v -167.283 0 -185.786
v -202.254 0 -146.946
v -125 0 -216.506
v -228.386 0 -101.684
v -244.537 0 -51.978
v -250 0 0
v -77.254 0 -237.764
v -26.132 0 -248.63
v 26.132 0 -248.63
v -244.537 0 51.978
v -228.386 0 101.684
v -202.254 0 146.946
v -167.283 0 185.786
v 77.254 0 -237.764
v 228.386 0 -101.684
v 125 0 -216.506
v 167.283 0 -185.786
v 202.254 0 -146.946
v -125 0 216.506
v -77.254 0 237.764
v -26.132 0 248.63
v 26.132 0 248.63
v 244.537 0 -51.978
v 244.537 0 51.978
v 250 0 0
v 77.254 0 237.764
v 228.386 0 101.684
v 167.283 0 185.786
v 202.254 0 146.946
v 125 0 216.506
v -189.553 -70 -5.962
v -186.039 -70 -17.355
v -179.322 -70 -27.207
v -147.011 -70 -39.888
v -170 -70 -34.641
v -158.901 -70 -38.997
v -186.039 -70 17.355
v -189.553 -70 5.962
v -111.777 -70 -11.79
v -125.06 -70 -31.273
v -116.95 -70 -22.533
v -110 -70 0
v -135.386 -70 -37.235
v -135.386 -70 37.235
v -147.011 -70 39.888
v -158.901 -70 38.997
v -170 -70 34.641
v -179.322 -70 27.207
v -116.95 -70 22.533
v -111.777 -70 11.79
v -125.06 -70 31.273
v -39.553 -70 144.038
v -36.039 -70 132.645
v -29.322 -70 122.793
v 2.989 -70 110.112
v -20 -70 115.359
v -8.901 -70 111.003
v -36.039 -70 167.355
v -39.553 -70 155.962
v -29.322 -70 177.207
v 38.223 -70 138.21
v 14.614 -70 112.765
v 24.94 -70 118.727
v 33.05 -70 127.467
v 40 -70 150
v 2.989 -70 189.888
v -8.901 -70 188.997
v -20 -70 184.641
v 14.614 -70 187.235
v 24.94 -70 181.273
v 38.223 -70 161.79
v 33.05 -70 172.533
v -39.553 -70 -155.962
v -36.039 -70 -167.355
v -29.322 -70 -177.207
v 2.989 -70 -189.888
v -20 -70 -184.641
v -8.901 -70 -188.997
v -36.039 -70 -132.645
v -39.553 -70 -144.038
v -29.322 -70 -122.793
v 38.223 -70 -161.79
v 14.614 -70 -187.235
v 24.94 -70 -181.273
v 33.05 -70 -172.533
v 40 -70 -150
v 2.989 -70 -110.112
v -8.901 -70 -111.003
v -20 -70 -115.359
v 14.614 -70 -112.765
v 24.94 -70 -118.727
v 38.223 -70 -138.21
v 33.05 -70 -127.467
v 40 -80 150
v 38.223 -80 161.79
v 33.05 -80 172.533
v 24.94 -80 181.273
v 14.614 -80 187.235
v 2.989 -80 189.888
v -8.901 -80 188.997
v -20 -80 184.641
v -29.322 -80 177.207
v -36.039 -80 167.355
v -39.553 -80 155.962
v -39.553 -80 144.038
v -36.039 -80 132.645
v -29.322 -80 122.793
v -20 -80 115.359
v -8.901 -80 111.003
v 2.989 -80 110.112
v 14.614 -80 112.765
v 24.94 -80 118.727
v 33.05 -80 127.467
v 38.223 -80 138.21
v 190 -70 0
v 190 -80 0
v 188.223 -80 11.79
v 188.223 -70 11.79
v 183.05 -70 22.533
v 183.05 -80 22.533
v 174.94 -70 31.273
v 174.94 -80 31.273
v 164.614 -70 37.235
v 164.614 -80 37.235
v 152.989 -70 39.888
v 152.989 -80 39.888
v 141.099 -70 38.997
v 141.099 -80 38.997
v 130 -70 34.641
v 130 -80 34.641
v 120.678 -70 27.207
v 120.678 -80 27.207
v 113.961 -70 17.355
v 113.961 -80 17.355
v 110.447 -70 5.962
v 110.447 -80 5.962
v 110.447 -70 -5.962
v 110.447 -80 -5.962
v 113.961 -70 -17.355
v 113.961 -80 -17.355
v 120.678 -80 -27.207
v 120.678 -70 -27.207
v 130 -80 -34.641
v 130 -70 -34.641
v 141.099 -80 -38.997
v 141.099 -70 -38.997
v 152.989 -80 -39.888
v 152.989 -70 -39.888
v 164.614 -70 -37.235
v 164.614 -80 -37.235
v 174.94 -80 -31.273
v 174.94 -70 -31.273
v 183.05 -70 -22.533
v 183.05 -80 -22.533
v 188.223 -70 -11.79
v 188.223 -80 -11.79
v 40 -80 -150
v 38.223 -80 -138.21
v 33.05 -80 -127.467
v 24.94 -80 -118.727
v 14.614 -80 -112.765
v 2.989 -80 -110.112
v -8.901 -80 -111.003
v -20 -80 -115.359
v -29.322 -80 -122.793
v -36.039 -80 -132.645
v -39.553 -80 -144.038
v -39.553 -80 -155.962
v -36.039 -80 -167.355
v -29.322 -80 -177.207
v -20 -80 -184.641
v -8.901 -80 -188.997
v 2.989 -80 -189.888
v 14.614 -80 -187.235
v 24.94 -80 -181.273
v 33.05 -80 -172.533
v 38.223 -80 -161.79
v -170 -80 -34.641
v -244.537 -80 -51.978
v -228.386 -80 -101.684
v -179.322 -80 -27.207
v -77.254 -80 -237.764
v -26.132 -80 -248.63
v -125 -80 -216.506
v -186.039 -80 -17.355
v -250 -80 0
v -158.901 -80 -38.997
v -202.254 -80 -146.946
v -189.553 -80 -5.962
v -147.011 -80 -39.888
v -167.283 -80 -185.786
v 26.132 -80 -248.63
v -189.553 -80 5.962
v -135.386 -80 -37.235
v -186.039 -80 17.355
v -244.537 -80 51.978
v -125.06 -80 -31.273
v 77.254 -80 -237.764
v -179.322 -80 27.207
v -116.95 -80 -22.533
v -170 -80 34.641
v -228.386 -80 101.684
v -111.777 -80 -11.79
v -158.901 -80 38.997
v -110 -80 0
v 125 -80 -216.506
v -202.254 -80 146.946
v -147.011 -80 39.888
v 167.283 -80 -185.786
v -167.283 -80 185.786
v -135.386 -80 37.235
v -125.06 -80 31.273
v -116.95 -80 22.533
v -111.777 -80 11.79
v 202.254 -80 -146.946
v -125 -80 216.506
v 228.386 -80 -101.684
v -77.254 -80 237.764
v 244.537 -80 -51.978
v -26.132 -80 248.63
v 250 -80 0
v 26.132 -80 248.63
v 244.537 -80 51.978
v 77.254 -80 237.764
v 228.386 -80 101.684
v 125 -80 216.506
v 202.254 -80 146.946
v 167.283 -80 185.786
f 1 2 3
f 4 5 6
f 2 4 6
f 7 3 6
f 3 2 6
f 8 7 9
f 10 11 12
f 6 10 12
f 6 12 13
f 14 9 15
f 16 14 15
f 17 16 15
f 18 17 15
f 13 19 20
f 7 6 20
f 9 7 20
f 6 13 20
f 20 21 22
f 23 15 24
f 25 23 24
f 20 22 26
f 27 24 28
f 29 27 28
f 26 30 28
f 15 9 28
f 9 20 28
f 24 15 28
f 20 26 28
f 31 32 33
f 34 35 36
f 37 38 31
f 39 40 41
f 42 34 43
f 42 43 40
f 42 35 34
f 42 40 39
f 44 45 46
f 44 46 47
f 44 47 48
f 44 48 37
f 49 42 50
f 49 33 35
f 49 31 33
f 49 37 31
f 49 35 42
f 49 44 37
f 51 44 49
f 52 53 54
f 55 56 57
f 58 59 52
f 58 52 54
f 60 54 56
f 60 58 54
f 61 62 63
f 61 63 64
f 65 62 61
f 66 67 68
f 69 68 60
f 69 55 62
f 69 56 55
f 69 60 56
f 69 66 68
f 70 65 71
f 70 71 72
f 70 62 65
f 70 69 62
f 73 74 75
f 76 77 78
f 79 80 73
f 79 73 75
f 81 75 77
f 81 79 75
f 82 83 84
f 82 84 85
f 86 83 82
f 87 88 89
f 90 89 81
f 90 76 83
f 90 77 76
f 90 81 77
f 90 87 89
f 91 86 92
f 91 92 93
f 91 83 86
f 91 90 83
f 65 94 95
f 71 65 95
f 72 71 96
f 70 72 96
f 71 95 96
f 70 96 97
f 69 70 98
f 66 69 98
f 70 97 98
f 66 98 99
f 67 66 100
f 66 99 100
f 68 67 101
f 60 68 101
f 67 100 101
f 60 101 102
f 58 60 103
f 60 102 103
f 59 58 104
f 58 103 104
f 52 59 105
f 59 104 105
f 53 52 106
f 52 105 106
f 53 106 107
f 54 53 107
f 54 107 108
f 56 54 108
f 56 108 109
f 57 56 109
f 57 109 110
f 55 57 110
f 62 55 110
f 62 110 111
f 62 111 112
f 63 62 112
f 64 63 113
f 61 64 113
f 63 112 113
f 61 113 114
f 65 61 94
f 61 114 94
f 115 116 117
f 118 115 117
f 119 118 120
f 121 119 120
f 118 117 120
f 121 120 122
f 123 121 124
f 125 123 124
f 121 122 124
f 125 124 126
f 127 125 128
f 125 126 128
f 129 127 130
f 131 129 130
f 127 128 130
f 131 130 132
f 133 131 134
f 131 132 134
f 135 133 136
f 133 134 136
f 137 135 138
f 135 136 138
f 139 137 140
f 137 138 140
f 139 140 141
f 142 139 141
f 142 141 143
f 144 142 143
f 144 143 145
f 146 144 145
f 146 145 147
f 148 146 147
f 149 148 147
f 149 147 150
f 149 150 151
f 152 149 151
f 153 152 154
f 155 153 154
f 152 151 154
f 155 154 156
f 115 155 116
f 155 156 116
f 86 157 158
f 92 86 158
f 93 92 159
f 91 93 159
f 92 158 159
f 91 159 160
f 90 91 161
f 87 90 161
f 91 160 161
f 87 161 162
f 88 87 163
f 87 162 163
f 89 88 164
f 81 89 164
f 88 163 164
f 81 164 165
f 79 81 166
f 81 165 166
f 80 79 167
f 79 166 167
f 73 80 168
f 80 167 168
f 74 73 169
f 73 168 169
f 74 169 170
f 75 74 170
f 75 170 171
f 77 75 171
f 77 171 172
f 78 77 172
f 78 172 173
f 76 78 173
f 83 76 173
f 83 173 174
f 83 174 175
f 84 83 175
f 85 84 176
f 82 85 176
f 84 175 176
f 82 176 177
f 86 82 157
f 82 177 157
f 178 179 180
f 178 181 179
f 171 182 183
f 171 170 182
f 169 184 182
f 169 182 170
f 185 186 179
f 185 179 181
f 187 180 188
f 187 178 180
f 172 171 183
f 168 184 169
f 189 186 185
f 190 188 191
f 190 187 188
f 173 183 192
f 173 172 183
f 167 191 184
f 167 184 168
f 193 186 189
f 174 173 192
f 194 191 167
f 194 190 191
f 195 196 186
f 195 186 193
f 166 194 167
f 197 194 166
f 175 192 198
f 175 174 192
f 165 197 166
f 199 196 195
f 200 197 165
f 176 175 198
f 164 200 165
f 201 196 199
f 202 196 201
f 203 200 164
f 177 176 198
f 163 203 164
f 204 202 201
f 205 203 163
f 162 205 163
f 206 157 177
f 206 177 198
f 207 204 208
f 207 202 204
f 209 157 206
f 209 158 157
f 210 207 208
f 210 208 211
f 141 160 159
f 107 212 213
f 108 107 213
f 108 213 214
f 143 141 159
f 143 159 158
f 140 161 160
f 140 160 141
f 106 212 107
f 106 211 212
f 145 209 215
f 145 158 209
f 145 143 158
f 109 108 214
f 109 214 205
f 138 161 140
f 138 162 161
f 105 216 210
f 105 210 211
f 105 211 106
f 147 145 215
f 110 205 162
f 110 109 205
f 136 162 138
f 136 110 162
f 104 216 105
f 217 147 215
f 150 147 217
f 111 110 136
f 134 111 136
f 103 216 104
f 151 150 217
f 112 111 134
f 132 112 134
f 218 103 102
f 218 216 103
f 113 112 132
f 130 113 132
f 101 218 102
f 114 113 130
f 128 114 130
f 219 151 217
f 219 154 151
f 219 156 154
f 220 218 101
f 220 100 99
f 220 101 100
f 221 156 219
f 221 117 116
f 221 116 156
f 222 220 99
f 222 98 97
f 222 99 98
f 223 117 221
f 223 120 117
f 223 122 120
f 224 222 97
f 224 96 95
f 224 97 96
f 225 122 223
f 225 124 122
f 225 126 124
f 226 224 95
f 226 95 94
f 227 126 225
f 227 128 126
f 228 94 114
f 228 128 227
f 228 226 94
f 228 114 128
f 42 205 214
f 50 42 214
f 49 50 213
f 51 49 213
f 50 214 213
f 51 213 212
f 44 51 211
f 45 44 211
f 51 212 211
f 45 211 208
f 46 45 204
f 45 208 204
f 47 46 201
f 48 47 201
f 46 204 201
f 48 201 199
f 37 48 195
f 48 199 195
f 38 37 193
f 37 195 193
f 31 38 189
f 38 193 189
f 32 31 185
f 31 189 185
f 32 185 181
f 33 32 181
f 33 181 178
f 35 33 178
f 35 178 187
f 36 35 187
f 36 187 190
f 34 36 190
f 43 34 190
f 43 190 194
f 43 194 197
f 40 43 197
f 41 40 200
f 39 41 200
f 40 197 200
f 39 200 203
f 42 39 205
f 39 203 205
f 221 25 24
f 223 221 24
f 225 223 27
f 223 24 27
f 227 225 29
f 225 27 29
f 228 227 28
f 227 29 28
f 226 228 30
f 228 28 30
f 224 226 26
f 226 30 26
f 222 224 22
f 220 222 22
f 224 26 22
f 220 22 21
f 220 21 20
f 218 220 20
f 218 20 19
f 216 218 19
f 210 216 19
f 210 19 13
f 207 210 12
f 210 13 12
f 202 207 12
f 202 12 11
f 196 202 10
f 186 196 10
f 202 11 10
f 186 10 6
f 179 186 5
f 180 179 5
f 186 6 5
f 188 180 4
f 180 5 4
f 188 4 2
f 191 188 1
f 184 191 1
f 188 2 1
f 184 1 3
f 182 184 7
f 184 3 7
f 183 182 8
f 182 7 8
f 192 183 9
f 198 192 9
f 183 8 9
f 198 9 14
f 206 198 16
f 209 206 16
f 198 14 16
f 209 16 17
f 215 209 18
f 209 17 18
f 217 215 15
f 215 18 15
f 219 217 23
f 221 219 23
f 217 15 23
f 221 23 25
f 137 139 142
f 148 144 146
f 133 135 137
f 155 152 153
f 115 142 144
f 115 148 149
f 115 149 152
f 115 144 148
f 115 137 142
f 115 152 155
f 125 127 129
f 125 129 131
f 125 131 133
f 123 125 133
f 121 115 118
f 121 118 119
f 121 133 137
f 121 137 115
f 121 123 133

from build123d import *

# Parameters (mm, degrees)
F0_R     = 250
F1_DEPTH = 80
F2_R     = 40
F3_DEPTH = 10


with BuildPart() as f1:
    # F0 (on Front) → F1 (new body)
    with BuildSketch(Plane.XZ):
        Circle(F0_R)
    extrude(amount=F1_DEPTH)

    # F2 (on face) → F3 (cut)
    with BuildSketch(Plane.XZ.offset(80)):
        with Locations((0, 150)):
            Circle(F2_R)
        with Locations((-150, 0)):
            Circle(F2_R)
        with Locations((0, -150)):
            Circle(F2_R)
        with Locations((150, 0)):
            Circle(F2_R)
    extrude(amount=-F3_DEPTH, mode=Mode.SUBTRACT)


solid = f1.part
